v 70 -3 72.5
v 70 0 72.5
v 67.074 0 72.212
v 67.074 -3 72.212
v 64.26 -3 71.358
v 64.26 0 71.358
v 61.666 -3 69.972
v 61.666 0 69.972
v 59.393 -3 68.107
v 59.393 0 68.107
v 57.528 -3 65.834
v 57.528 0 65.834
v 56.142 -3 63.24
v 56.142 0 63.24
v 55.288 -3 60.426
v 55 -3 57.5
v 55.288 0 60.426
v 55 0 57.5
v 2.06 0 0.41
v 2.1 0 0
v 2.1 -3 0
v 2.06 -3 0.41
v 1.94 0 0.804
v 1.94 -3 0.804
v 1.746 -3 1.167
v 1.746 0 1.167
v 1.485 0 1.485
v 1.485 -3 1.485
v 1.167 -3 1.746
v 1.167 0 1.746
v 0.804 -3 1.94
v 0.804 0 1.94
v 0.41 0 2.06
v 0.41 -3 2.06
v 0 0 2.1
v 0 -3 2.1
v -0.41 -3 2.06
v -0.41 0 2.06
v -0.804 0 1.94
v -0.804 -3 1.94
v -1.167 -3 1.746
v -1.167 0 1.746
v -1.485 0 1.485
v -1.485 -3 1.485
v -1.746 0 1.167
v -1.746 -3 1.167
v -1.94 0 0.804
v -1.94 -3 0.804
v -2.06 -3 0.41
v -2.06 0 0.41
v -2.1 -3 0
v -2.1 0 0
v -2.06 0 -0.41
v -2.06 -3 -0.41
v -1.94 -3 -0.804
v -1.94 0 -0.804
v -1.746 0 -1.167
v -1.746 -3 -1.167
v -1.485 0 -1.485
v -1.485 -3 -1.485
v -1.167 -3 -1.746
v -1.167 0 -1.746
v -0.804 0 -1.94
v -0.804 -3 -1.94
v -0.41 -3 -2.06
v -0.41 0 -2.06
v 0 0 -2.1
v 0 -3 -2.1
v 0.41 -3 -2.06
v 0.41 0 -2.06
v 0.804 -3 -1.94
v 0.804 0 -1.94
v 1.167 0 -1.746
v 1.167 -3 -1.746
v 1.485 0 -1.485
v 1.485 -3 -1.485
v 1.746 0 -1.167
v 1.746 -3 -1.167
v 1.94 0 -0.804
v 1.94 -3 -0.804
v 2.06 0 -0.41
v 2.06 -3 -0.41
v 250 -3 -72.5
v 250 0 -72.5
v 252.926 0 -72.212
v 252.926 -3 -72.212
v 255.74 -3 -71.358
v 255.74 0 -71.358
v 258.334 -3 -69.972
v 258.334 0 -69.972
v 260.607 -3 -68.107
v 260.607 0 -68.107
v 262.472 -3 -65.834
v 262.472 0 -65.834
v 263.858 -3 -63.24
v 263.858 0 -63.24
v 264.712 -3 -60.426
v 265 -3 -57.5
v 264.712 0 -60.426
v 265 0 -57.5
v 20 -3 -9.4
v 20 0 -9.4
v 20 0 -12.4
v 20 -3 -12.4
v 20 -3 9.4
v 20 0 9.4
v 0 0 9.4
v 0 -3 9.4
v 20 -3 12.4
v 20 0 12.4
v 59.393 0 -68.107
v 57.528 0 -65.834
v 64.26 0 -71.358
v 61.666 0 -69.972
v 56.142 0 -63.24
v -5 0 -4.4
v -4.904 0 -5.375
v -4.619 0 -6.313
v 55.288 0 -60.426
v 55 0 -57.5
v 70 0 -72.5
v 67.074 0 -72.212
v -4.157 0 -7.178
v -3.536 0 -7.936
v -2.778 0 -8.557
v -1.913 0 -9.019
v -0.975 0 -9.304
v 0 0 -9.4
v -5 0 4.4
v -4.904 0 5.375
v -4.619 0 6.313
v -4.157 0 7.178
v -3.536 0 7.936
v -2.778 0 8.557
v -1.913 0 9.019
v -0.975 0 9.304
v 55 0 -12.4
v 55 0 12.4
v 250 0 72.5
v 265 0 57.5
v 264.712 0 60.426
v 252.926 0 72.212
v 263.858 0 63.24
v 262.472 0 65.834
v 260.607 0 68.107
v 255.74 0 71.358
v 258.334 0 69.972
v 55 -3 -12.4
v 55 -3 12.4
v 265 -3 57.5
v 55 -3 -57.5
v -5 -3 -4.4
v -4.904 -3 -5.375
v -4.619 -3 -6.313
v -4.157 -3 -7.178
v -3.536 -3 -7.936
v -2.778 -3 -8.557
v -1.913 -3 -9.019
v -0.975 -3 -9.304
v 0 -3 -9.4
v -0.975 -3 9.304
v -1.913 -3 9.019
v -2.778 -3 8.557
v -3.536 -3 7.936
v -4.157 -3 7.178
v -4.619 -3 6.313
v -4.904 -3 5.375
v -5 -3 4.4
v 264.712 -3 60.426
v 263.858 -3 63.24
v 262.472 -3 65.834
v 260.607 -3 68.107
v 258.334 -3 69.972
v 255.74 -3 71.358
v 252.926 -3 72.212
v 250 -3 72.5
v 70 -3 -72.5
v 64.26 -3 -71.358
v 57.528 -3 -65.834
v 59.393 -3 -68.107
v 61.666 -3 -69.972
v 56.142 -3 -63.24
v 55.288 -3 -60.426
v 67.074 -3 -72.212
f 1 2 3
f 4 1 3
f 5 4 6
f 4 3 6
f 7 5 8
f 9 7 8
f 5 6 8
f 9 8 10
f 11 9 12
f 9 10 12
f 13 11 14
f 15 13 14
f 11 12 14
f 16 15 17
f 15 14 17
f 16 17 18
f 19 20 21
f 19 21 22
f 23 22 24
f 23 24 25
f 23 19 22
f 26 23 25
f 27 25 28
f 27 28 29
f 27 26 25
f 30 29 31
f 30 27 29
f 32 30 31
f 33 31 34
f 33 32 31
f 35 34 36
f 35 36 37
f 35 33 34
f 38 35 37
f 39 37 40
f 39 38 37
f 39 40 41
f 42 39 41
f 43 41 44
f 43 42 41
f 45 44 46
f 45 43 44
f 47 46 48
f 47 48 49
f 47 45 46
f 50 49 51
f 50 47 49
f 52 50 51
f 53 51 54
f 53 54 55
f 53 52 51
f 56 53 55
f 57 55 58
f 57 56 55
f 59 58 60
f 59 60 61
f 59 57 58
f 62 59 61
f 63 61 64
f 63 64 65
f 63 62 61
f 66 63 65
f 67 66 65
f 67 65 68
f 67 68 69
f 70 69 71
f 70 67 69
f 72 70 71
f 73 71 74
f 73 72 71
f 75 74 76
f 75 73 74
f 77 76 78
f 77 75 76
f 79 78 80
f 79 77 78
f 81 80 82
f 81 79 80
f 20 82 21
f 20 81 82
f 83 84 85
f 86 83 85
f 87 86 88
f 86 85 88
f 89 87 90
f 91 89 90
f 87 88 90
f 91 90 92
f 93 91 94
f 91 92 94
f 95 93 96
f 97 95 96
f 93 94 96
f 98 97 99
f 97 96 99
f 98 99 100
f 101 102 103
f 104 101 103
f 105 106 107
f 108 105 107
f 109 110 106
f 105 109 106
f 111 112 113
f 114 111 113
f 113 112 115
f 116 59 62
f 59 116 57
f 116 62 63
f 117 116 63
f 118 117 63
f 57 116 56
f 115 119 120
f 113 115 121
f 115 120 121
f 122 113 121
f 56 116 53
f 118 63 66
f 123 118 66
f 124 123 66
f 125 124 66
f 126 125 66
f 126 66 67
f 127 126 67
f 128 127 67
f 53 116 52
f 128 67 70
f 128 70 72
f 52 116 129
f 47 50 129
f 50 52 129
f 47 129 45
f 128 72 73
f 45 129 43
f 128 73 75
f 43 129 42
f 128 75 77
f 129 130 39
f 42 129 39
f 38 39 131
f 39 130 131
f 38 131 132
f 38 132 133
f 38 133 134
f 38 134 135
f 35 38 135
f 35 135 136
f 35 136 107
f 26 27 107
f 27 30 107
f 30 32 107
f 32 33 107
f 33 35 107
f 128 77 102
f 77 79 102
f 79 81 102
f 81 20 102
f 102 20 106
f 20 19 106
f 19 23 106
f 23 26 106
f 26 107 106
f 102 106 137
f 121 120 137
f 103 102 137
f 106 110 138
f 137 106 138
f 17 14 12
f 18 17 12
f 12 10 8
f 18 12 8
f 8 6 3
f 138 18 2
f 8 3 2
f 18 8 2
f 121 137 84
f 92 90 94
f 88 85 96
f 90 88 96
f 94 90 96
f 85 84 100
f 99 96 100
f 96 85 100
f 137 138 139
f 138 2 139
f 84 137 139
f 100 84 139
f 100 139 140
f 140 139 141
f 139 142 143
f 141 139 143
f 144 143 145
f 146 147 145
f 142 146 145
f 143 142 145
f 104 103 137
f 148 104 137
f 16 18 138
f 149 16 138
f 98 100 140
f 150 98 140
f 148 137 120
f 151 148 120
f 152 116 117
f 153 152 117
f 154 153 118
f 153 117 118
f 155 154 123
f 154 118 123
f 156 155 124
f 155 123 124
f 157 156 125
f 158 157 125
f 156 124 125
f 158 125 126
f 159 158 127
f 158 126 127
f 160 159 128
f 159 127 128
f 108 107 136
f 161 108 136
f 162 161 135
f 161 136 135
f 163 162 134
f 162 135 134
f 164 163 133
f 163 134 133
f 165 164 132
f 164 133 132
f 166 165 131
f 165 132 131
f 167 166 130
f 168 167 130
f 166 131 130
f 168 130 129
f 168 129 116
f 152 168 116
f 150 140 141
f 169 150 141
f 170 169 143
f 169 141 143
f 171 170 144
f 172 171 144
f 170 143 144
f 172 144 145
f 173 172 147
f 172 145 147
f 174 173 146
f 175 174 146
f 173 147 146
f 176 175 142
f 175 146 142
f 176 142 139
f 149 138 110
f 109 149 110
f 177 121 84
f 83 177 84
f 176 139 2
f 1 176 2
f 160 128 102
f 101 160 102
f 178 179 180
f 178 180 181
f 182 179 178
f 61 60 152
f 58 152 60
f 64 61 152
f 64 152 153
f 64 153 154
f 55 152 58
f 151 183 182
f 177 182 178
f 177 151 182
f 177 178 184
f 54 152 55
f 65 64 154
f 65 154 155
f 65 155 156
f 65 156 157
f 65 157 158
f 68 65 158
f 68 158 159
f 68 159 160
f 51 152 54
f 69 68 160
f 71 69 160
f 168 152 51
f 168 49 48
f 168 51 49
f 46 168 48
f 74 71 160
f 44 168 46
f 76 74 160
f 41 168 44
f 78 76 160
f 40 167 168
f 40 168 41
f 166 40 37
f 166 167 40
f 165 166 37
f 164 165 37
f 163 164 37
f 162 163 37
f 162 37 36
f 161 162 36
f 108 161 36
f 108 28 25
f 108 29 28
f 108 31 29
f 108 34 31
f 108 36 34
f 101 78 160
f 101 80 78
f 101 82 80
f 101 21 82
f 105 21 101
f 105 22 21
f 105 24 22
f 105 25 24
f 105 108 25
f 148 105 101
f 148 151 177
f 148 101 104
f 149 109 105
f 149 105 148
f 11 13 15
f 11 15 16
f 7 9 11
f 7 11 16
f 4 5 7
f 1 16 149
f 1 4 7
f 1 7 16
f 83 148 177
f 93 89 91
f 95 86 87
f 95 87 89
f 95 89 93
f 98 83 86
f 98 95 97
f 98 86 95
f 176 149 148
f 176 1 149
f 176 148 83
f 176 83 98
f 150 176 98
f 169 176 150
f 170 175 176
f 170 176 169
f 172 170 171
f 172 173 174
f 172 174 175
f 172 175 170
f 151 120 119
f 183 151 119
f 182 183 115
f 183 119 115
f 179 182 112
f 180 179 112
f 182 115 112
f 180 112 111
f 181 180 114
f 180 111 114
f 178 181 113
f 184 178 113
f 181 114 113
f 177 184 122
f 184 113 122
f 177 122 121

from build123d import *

# Parameters (mm, degrees)
F0_R     = 2.1
F1_DEPTH = 3


with BuildPart() as f1:
    # F0 (on Front) → F1 (new body)
    with BuildSketch(Plane.XZ):
        with BuildLine():
            Line((70, -72.5), (250, -72.5))
            ThreePointArc((250, -72.5), (260.606602, -68.106602), (265, -57.5))
            Line((265, -57.5), (265, 57.5))
            ThreePointArc((265, 57.5), (260.606602, 68.106602), (250, 72.5))
            Line((250, 72.5), (70, 72.5))
            ThreePointArc((70, 72.5), (59.393398, 68.106602), (55, 57.5))
            Line((55, 57.5), (55, 15.4))
            Line((55, 15.4), (55, 12.4))
            Line((55, 12.4), (20, 12.4))
            Line((20, 12.4), (20, 9.4))
            Line((20, 9.4), (0, 9.4))
            ThreePointArc((0, 9.4), (-3.535534, 7.935534), (-5, 4.4))
            Line((-5, 4.4), (-5, 0))
            Line((-5, 0), (-5, -4.4))
            ThreePointArc((-5, -4.4), (-3.535534, -7.935534), (0, -9.4))
            Line((0, -9.4), (20, -9.4))
            Line((20, -9.4), (20, -12.4))
            Line((20, -12.4), (55, -12.4))
            Line((55, -12.4), (55, -57.5))
            ThreePointArc((55, -57.5), (59.393398, -68.106602), (70, -72.5))
        make_face()
        Circle(F0_R, mode=Mode.SUBTRACT)
    extrude(amount=F1_DEPTH)


solid = f1.part
